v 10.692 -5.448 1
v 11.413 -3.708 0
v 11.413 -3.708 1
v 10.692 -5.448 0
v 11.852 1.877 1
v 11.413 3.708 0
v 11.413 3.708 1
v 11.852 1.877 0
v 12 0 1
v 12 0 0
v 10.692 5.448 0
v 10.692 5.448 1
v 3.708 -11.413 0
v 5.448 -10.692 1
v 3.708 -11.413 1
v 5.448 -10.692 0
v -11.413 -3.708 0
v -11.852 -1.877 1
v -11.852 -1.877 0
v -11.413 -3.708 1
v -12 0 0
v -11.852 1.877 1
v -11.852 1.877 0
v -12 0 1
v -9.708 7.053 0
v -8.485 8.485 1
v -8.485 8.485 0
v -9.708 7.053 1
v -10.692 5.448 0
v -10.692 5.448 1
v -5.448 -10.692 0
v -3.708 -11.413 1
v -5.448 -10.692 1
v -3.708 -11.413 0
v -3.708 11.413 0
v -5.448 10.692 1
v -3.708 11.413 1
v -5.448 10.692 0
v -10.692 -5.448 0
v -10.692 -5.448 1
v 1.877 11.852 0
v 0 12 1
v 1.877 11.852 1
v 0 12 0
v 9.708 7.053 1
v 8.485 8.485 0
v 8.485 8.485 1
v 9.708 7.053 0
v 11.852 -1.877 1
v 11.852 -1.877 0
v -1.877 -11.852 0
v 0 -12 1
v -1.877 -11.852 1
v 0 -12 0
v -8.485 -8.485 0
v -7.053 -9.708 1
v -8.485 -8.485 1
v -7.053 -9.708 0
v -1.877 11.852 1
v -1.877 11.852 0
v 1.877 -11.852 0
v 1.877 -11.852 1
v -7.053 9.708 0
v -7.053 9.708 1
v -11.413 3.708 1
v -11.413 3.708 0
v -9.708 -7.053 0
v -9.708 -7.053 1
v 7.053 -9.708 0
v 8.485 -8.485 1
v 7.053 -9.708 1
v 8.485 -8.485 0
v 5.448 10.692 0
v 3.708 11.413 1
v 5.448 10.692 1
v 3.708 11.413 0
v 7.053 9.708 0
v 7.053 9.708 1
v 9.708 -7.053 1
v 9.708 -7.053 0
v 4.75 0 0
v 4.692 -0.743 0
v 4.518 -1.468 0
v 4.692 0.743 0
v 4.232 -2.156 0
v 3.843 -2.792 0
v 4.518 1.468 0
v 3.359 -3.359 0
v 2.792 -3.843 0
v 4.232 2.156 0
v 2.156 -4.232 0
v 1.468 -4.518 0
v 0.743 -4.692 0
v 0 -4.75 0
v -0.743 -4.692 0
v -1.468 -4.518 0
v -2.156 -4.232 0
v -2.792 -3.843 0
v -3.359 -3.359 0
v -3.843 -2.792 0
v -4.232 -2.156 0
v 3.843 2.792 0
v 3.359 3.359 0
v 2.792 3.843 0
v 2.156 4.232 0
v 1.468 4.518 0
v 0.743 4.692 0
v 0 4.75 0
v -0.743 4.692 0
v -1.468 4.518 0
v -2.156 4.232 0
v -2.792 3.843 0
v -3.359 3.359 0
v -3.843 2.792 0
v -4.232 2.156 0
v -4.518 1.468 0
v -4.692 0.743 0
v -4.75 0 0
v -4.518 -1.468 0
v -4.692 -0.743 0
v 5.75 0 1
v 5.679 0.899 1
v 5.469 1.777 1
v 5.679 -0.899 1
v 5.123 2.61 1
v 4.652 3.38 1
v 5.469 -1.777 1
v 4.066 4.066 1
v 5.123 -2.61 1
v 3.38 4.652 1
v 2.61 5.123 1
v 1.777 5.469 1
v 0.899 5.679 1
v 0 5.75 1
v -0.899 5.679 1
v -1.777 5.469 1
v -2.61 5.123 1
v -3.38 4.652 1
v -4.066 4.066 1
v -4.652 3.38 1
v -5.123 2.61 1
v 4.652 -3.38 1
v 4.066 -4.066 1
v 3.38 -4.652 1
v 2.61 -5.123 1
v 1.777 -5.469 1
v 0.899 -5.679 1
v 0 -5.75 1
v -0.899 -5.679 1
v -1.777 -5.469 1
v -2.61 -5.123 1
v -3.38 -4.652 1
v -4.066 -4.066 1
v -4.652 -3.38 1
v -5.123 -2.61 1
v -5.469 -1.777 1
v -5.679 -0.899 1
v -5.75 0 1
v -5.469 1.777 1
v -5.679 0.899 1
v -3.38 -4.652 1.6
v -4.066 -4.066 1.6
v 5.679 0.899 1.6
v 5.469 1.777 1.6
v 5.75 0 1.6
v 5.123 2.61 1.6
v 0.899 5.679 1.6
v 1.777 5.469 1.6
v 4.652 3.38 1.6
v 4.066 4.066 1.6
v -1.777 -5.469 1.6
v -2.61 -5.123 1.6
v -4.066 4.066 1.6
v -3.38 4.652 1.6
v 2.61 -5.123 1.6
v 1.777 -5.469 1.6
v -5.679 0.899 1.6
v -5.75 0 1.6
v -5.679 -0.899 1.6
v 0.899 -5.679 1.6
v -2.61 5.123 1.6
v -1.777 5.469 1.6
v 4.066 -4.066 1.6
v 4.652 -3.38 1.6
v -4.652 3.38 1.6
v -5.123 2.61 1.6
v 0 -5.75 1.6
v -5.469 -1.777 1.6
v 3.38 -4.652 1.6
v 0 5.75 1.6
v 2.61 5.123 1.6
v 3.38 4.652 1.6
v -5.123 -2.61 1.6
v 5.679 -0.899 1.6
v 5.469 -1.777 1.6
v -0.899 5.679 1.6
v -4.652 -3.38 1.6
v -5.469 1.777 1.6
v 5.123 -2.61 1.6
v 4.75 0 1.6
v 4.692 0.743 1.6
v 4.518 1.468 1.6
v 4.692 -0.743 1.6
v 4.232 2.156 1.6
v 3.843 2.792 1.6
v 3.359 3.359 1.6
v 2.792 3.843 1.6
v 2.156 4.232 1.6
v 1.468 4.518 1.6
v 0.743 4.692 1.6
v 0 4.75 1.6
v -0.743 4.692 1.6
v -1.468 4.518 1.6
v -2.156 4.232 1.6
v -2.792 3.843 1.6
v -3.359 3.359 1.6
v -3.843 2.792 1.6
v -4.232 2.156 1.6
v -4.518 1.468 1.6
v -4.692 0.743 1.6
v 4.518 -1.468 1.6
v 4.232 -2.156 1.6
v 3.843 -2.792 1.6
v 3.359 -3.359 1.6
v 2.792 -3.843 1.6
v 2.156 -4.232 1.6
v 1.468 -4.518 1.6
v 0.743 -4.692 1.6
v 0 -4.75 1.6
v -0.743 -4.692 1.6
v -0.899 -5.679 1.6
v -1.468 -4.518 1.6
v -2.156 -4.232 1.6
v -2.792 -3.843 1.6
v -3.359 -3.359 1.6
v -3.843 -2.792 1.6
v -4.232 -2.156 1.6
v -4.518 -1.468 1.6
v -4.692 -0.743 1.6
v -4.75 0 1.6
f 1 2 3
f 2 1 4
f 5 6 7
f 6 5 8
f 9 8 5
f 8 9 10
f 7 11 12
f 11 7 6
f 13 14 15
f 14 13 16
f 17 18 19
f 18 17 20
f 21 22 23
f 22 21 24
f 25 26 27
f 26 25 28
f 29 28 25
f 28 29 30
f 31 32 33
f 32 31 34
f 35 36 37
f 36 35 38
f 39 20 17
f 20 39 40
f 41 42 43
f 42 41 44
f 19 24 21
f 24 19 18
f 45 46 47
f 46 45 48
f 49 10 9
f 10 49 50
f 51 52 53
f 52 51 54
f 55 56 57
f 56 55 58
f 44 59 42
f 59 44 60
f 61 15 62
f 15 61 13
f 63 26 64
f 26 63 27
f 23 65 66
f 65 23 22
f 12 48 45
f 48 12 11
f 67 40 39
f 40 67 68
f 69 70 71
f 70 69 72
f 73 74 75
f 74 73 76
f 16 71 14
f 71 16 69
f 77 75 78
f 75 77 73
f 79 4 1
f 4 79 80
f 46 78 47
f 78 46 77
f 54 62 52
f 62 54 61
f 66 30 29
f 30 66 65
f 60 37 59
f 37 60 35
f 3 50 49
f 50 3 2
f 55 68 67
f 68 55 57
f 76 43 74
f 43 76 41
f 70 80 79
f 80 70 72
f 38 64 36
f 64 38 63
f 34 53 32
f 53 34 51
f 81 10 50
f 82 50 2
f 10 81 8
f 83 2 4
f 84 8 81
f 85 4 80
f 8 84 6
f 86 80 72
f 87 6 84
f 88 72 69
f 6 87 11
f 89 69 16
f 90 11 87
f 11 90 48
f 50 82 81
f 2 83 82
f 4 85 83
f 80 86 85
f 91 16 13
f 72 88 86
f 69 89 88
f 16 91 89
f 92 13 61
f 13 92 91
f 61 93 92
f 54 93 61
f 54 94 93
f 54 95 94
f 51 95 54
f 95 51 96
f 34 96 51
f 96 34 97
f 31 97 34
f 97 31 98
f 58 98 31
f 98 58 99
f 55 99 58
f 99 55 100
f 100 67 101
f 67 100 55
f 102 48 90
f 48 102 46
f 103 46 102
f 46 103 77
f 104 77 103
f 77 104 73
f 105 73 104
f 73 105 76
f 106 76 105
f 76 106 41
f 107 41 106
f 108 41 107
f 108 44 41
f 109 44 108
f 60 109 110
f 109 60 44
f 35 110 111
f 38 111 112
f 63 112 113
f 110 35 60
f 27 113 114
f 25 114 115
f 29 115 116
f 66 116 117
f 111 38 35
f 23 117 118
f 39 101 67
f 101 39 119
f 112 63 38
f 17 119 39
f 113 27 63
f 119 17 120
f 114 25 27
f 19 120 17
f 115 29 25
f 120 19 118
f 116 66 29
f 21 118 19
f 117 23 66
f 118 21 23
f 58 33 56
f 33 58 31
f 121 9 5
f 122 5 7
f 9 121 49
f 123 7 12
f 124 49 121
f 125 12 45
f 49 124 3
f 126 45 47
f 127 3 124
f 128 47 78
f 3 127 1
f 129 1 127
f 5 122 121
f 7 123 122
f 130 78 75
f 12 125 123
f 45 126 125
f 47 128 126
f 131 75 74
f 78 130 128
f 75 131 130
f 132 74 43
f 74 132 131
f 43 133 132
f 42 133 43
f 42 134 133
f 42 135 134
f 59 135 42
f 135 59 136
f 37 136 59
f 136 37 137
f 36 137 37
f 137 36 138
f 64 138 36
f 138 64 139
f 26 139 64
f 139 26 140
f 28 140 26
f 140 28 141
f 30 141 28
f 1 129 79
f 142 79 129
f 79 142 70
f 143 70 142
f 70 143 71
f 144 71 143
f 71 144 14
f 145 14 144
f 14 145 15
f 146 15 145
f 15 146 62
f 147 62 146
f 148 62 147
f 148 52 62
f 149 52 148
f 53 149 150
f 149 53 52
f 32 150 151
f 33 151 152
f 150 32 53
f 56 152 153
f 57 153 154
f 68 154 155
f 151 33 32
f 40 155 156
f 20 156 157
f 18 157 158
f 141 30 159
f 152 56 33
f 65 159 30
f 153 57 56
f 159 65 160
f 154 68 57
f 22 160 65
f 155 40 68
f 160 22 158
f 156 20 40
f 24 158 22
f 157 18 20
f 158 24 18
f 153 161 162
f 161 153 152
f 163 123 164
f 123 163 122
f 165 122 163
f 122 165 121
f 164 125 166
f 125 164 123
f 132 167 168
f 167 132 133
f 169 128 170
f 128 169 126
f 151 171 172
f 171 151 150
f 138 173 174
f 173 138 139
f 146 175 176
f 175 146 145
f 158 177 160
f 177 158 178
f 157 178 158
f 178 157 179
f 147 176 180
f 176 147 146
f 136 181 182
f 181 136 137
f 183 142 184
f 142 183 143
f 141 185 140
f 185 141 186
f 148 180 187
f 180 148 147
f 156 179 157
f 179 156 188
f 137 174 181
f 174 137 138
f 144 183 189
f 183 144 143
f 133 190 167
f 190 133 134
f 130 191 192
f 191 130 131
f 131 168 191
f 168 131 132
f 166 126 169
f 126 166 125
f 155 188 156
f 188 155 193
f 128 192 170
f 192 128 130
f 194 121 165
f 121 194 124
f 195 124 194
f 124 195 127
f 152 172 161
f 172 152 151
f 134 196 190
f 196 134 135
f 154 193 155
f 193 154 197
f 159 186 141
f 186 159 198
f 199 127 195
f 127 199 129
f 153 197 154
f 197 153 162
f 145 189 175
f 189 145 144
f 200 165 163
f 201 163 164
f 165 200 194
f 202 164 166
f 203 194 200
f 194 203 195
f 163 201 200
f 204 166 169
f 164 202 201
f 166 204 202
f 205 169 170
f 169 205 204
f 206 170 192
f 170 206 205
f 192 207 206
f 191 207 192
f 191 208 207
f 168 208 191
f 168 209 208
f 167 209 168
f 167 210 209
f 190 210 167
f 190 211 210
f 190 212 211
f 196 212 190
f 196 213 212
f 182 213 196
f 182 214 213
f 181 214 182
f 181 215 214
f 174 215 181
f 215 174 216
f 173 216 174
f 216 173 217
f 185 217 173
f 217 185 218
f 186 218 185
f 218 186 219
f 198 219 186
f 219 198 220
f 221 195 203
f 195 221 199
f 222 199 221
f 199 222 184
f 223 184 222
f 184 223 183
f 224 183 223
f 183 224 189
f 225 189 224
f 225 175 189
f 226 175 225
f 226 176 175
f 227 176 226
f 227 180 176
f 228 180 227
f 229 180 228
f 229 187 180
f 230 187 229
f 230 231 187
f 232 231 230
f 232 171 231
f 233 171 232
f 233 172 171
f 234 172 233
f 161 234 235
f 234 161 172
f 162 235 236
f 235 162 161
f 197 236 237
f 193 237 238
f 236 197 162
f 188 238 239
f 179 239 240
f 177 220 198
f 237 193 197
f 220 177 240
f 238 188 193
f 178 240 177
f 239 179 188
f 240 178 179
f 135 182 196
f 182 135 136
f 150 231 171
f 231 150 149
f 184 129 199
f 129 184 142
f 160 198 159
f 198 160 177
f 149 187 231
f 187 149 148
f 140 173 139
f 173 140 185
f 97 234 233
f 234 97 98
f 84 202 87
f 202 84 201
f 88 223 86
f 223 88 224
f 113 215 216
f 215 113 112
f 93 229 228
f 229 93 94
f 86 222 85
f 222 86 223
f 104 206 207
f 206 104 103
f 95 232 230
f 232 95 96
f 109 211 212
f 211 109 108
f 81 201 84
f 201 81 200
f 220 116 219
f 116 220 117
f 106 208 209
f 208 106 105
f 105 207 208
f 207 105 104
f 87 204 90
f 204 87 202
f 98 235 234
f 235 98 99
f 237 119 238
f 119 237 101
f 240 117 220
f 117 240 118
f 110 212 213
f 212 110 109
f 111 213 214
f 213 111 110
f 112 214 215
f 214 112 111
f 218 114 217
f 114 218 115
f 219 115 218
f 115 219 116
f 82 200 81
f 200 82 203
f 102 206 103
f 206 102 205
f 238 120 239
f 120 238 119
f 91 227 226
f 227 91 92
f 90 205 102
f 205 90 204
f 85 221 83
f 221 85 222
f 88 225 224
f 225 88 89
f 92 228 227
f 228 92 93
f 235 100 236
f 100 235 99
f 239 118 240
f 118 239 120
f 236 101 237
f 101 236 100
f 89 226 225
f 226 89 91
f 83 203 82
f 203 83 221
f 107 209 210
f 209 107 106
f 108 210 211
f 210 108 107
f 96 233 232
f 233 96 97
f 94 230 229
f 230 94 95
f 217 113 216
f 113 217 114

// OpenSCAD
// file: washer_spacer.scad
// ideally this matches the bearing spacer thickness/diameter in the roller design
washer_thickness = 0.6;
washer_diameter = 11.5;
// the inner diameter can be a bit larger to make it easier for mounting
washer_inner_diameter = 8;
spacer_thickness = 1.0;
spacer_inner_diameter = 9.5;
// this needs to be a bit larger than the bearing so the spool can't slip
spacer_diameter = 24;

$fn=40;
// main file
include <washer_spacer.scad>;

difference(){
  union(){
    cylinder(r=spacer_diameter/2, h=spacer_thickness);
    translate([0, 0, spacer_thickness]){

      cylinder(r=washer_diameter/2, h=washer_thickness);
    }
  }
  cylinder(r=spacer_inner_diameter/2, h=washer_thickness+spacer_thickness);
}
